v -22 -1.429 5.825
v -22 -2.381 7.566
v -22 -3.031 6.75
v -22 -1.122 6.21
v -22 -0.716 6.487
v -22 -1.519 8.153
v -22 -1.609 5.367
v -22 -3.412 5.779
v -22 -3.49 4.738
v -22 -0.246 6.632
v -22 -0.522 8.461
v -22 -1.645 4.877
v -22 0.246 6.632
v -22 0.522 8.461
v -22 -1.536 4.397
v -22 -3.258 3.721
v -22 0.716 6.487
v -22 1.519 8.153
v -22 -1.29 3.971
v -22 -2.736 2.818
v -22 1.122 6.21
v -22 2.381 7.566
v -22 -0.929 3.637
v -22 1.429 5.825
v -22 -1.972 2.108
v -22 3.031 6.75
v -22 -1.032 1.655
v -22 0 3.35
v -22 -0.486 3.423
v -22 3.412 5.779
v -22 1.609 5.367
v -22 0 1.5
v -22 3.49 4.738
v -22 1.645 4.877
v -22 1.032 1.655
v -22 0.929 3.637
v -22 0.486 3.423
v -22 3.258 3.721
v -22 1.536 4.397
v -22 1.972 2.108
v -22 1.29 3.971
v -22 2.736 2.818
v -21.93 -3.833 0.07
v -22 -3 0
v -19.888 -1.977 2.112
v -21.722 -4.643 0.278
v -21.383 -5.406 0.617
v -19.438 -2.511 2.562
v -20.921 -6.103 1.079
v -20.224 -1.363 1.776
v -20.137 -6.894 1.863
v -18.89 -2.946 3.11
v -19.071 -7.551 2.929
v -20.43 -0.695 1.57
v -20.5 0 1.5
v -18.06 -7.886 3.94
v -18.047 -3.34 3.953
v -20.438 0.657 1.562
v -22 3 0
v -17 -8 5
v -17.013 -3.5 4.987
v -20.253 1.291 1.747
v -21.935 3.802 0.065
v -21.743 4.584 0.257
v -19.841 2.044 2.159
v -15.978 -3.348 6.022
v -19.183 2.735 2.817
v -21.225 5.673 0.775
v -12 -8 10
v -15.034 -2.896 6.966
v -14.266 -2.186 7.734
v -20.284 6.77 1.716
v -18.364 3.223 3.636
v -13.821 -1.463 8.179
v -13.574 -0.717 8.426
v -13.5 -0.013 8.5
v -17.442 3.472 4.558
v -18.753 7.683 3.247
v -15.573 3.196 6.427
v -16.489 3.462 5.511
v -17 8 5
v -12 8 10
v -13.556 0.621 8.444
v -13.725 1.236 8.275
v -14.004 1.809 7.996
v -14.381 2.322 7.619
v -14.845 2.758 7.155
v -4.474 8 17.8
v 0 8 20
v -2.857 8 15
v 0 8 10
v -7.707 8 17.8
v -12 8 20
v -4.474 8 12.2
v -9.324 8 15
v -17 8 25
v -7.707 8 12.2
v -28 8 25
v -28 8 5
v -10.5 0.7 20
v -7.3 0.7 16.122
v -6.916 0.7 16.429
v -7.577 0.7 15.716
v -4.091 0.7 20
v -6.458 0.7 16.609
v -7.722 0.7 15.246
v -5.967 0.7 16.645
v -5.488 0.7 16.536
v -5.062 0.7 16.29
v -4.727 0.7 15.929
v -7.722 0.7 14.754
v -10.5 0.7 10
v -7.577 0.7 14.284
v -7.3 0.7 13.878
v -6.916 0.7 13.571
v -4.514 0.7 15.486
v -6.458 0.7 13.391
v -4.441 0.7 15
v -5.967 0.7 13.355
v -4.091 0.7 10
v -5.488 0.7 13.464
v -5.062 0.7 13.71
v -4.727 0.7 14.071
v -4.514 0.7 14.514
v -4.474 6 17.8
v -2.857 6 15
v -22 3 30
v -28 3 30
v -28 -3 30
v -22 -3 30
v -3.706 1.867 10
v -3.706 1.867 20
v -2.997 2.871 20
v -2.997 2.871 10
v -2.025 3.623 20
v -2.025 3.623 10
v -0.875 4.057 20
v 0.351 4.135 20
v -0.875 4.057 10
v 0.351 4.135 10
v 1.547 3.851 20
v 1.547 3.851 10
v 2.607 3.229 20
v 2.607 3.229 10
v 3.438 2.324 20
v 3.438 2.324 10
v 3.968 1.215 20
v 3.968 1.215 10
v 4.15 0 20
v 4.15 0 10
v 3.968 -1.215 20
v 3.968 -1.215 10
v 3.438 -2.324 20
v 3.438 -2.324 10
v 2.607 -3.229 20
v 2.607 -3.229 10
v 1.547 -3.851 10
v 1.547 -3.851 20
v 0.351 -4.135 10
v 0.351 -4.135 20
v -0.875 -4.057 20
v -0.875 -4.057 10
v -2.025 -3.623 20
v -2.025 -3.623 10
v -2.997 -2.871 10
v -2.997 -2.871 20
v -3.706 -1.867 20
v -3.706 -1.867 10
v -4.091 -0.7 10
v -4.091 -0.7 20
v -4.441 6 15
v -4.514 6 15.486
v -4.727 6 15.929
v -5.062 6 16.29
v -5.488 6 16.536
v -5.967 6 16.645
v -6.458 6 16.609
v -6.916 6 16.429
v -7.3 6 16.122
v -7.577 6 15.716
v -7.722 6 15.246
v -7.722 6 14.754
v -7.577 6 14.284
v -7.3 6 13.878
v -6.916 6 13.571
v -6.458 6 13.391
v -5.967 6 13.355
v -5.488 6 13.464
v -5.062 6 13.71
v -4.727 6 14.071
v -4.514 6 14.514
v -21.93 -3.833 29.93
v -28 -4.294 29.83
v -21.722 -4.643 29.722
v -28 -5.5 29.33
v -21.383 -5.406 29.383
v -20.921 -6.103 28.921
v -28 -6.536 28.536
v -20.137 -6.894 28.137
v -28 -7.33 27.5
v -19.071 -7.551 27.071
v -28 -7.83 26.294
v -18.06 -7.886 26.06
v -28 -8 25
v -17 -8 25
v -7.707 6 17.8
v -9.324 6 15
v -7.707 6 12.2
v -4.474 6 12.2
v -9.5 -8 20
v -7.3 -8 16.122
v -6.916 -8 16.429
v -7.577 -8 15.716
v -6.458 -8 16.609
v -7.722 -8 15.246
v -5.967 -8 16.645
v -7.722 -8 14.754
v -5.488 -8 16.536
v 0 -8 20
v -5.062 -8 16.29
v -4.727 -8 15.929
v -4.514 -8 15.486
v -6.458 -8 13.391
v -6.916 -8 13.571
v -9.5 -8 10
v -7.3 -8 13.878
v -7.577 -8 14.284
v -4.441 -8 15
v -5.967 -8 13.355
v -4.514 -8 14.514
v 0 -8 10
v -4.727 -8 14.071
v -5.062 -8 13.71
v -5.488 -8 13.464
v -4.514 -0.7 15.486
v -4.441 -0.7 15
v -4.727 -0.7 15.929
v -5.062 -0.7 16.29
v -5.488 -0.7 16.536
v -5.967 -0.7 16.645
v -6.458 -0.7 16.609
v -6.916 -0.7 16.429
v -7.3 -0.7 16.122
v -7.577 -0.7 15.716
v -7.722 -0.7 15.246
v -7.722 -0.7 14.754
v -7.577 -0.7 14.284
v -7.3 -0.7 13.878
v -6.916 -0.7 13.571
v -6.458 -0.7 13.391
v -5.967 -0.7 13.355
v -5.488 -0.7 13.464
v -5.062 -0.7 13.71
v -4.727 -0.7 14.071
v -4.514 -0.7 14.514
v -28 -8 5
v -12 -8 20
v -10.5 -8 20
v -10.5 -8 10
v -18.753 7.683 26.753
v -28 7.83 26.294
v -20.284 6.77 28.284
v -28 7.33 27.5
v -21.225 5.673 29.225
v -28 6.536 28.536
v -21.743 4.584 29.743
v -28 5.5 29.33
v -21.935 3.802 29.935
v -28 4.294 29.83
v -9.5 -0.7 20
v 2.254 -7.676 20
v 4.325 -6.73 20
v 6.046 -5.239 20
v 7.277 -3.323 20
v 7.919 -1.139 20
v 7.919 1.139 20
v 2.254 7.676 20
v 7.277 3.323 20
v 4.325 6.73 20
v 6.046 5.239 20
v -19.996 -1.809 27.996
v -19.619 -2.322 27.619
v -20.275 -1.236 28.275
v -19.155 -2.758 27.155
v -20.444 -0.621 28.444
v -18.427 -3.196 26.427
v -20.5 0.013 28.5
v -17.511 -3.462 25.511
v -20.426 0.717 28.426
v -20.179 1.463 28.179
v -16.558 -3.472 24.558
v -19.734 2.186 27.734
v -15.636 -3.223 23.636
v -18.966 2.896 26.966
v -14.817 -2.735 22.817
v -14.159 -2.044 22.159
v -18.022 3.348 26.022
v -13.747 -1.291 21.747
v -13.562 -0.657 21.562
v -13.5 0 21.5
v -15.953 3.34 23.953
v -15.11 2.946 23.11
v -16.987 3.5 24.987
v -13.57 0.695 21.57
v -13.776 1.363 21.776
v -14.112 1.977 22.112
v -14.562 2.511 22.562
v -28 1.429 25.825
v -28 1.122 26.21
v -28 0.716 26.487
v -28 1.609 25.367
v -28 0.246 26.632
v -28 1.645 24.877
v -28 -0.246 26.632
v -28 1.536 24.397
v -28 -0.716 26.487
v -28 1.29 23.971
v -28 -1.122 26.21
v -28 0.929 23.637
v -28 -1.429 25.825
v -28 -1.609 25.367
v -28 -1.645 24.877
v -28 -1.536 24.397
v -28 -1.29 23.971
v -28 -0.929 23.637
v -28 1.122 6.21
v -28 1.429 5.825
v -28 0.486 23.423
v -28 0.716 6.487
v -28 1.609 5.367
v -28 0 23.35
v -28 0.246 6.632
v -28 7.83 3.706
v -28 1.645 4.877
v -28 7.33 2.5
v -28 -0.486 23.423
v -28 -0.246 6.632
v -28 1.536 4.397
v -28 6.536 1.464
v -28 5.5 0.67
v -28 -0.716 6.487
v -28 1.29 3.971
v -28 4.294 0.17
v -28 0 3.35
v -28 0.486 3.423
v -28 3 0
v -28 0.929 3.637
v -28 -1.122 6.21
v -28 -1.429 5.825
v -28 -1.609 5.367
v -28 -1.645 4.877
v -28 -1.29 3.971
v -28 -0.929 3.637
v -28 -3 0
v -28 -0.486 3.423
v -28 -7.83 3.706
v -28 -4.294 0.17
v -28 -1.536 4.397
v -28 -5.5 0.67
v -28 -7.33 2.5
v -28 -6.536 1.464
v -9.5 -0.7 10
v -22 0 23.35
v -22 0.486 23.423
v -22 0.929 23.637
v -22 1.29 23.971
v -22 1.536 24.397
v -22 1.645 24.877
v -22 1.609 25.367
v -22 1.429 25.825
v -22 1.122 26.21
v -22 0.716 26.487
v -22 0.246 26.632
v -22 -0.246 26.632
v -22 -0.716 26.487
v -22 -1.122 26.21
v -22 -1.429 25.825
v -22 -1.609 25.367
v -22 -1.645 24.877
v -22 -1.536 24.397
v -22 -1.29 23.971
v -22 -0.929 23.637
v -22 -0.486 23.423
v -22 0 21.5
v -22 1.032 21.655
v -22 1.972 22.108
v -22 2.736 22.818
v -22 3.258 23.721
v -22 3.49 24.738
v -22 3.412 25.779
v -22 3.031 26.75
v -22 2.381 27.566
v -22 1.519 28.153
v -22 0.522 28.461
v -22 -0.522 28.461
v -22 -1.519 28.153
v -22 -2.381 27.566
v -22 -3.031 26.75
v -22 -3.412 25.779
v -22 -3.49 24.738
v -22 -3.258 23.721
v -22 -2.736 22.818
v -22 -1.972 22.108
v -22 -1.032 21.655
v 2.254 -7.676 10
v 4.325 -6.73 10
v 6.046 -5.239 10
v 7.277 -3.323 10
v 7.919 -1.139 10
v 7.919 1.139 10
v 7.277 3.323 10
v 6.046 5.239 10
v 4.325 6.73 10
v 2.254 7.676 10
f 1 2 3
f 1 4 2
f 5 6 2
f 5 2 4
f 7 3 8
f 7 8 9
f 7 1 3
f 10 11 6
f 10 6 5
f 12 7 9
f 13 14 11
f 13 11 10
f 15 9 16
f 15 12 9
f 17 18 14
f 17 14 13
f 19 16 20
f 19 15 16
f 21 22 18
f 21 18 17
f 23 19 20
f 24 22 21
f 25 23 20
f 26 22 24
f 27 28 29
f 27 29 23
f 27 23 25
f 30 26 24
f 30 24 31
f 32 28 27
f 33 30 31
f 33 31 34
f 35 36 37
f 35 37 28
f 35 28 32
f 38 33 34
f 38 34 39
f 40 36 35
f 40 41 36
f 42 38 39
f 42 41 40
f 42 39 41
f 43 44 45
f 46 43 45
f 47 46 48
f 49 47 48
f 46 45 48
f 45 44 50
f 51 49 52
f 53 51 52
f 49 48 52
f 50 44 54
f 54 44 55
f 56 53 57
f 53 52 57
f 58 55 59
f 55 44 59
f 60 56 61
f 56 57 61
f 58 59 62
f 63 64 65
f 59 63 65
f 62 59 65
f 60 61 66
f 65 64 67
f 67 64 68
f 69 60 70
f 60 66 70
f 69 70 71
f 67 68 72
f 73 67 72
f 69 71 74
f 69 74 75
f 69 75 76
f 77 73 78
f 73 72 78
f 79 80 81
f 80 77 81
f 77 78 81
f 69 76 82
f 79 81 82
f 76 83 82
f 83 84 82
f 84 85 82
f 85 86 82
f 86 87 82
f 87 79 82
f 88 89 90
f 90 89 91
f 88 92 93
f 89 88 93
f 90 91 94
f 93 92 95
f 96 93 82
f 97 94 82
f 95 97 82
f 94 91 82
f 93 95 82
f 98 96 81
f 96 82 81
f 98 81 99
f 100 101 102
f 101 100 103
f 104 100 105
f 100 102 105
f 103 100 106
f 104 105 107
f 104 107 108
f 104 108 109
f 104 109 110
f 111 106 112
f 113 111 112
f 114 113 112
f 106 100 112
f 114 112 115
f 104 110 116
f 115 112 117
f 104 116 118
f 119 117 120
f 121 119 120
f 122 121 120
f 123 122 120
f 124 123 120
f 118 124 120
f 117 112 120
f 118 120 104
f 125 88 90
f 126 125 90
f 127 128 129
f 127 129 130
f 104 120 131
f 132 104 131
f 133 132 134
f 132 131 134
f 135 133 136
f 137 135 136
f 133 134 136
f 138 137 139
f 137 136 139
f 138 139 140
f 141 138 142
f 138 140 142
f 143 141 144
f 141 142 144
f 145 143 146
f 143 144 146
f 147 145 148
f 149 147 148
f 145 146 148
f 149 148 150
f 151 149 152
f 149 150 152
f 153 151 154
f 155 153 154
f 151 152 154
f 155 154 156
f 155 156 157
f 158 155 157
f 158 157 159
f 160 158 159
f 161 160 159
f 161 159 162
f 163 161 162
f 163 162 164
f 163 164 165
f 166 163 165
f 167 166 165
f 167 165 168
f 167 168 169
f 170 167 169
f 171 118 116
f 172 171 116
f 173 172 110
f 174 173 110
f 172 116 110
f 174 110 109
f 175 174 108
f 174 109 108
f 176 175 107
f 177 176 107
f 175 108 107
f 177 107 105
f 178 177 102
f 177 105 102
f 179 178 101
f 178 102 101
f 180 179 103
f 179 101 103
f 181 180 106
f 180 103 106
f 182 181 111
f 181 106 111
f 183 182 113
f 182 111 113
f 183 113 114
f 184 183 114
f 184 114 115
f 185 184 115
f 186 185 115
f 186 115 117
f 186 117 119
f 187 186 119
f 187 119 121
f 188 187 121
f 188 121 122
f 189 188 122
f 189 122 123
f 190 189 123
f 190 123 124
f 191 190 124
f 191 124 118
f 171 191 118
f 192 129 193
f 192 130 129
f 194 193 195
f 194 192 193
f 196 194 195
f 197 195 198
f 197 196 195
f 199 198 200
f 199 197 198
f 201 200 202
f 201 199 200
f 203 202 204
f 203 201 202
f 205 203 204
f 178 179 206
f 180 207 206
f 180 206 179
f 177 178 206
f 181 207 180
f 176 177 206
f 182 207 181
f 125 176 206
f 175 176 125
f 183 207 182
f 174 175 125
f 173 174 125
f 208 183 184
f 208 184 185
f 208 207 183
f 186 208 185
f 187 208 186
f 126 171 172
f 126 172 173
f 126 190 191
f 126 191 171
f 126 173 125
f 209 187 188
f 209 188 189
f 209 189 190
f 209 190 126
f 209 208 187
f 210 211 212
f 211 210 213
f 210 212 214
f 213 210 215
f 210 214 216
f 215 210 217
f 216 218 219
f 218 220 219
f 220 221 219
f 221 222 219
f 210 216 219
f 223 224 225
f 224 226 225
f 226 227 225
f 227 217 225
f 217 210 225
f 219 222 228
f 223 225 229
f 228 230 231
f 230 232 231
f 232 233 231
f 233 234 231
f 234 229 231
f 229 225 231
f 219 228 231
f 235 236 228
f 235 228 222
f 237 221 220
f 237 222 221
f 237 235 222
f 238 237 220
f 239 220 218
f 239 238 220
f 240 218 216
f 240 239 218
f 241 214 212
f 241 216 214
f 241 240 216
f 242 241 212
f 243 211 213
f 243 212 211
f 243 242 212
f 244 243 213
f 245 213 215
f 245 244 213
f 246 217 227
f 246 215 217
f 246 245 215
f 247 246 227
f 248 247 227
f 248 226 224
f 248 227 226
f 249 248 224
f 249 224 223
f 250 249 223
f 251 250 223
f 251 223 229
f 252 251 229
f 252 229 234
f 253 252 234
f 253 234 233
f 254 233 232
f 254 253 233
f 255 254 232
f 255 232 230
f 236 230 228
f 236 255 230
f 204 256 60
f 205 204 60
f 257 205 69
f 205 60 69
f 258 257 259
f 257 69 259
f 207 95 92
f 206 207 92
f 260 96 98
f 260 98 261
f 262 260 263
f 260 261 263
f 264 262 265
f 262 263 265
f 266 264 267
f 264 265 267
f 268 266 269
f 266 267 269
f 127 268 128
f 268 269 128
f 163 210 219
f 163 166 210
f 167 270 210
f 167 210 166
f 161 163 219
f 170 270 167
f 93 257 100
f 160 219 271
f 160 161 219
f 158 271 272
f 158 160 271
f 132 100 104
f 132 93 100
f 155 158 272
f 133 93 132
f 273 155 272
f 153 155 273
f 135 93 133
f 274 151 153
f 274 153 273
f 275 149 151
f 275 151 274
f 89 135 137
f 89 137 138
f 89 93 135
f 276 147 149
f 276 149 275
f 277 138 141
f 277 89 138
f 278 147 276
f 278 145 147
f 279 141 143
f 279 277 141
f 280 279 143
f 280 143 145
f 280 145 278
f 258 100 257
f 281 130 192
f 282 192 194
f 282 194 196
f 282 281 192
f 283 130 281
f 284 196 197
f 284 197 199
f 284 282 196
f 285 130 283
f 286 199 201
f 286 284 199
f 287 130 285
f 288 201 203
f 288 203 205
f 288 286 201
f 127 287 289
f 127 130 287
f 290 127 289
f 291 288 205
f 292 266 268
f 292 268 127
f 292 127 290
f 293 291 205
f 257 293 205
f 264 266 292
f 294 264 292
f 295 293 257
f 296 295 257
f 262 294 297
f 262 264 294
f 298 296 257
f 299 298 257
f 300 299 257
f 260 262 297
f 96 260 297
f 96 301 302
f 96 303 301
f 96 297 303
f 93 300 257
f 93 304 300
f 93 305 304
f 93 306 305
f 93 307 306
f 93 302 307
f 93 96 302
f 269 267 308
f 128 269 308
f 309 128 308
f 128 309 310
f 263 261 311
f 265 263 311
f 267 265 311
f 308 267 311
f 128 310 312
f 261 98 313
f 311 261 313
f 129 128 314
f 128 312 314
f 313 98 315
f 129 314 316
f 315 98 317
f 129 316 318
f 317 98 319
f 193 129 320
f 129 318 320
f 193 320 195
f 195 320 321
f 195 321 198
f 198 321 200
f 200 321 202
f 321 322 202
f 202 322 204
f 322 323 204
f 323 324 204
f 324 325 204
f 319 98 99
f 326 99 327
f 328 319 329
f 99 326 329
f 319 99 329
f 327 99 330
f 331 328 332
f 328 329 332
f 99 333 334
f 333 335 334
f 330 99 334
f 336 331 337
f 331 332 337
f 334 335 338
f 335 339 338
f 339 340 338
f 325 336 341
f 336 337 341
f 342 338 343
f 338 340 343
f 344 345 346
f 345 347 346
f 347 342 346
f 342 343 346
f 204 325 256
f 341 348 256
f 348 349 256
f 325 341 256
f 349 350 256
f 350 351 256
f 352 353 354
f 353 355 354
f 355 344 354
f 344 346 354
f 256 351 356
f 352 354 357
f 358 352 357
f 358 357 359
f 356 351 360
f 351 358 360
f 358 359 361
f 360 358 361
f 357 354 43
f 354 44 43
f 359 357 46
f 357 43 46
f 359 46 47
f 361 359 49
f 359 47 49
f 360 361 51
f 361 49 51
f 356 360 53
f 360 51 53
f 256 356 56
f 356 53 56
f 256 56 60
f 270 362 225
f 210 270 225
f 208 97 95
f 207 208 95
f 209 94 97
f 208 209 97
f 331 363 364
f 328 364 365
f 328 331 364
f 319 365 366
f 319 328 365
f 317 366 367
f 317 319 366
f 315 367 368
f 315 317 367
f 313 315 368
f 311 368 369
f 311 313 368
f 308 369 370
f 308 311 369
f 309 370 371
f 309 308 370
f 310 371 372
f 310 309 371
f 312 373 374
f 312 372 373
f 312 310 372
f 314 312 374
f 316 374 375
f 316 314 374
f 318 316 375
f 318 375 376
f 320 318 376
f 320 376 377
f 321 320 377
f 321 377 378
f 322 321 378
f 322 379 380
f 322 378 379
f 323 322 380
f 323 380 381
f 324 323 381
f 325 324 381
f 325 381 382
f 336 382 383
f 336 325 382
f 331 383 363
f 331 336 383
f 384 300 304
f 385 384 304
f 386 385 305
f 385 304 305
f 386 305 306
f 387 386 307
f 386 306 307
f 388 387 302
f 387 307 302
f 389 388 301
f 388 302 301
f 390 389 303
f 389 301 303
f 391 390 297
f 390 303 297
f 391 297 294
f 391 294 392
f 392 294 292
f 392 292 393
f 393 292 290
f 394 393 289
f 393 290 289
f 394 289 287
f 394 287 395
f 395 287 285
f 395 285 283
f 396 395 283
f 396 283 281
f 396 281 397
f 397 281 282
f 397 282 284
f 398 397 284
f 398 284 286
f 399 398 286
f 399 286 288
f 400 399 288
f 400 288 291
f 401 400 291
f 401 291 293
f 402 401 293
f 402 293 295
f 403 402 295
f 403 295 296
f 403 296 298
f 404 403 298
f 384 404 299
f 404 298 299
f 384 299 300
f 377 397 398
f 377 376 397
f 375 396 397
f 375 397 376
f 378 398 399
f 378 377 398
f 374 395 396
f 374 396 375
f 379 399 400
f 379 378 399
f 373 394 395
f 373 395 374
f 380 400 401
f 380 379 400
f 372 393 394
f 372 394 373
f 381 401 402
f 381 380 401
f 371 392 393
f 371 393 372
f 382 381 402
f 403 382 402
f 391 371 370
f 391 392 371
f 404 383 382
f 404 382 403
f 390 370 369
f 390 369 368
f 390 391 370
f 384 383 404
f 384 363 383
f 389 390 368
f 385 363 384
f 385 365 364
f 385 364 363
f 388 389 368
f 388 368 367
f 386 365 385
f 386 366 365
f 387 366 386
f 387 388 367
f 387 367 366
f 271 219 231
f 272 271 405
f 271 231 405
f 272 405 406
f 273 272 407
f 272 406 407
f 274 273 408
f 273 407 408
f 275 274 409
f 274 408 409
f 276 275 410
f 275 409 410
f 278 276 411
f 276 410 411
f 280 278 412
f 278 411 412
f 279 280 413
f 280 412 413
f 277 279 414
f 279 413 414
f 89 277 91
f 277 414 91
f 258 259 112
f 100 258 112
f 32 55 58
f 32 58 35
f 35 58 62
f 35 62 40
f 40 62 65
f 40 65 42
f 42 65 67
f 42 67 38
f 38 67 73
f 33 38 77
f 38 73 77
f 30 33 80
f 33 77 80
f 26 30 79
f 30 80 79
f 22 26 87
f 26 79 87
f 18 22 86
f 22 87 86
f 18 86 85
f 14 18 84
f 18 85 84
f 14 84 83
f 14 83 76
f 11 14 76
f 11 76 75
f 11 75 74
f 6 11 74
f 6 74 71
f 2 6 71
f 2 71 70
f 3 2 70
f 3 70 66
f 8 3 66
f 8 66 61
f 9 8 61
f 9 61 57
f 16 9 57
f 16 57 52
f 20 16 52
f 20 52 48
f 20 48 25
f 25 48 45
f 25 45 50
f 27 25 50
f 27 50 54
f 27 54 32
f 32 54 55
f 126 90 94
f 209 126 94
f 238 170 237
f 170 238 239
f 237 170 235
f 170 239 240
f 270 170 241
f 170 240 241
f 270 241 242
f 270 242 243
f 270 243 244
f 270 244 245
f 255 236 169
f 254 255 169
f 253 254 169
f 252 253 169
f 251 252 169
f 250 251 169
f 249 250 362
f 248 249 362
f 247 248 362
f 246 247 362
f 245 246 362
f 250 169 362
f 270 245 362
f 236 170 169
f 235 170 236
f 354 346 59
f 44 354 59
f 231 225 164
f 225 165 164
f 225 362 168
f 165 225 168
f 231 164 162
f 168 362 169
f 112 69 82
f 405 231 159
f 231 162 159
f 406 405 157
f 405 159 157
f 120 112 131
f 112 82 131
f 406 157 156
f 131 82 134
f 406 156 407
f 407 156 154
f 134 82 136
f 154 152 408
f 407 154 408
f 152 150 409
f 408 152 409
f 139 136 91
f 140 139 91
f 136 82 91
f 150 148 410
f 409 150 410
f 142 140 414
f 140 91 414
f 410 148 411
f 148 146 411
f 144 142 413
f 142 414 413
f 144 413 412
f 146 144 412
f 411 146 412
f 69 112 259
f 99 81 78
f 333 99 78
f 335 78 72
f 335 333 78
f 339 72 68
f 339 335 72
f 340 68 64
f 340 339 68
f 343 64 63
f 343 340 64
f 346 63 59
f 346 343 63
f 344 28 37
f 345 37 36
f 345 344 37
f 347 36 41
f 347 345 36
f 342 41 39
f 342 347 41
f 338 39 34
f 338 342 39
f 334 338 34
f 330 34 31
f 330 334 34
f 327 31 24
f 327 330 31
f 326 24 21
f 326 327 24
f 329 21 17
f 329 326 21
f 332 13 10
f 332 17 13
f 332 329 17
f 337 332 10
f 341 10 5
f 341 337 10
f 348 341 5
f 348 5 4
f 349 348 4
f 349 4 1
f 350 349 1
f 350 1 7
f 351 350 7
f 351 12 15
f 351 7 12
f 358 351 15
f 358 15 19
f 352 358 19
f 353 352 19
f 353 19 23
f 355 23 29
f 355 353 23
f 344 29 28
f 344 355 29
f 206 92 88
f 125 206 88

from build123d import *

# Parameters (mm, degrees)
RESSALTO_EXTRUS_O1_DEPTH   = 30
CORTE_EXTRUS_O6_DEPTH      = 17
ESBO_O6_R                  = 1.65
CORTE_EXTRUS_O4_DEPTH      = 9.7
CORTE_EXTRUS_O4_DEPTH_BACK = 8.3
CORTE_EXTRUS_O5_DEPTH      = 2
ESBO_O9_R                  = 1.65
CORTE_EXTRUS_O7_DEPTH      = 37
FILETE1_R                  = 5
ESBO_O10_R                 = 3.5
CORTE_EXTRUS_O8_DEPTH      = 22


with BuildPart() as part:
    # Esboço2 → Ressalto-extrusão1 (new body)
    with BuildSketch(Plane.XY):
        with BuildLine():
            Line((0, 8), (-28, 8))
            Line((-28, 8), (-28, -8))
            Line((-28, -8), (-10.5, -8))
            Line((-10.5, -8), (-10.5, 0.7))
            Line((-10.5, 0.7), (-4.090537862, 0.7))
            ThreePointArc((-4.090537862, 0.7), (4.15, 0), (-4.090537862, -0.7))
            Line((-4.090537862, -0.7), (-9.5, -0.7))
            Line((-9.5, -0.7), (-9.5, -8))
            Line((-9.5, -8), (0, -8))
            ThreePointArc((0, -8), (8, 0), (0, 8))
        make_face()
    extrude(amount=RESSALTO_EXTRUS_O1_DEPTH)

    # Esboço8 → Corte-extrusão6 (cut, through all)
    with BuildSketch(Plane(origin=(0, 8, 0), x_dir=(1, 0, 0), z_dir=(0, 1, 0))):
        Polygon((-22, -30), (-12, -20), (8, -20), (8, -30), align=None)
        Polygon((8, 0), (-22, 0), (-12, -10), (8, -10), align=None)
    extrude(amount=-CORTE_EXTRUS_O6_DEPTH, mode=Mode.SUBTRACT)

    # Esboço6 → Corte-extrusão4 (cut, two sides)
    with BuildSketch(Plane.XZ.offset(-0.7)) as corte_extrus_o4_sk:
        with Locations((-6.090537862, 15)):
            Circle(ESBO_O6_R)
    extrude(amount=CORTE_EXTRUS_O4_DEPTH, mode=Mode.SUBTRACT)
    extrude(corte_extrus_o4_sk.sketch, amount=-CORTE_EXTRUS_O4_DEPTH_BACK, mode=Mode.SUBTRACT)

    # Esboço7 → Corte-extrusão5 (cut)
    with BuildSketch(Plane(origin=(0, 8, 0), x_dir=(1, 0, 0), z_dir=(0, 1, 0))):
        Polygon((-2.857376354, -15), (-4.473957108, -12.2), (-7.707118616, -12.2), (-9.323699369, -15), (-7.707118616, -17.8), (-4.473957108, -17.8), align=None)
    extrude(amount=-CORTE_EXTRUS_O5_DEPTH, mode=Mode.SUBTRACT)

    # Esboço9 → Corte-extrusão7 (cut, through all)
    with BuildSketch(Plane(origin=(-28, 0, 19.455844123), x_dir=(0, 0, -1), z_dir=(1, 0, 0))):
        with Locations((14.455844123, 0)):
            Circle(ESBO_O9_R)
        with Locations((-5.544155877, 0)):
            Circle(ESBO_O9_R)
    extrude(amount=CORTE_EXTRUS_O7_DEPTH, mode=Mode.SUBTRACT)

    # Filete1
    filete1_edges = [part.edges().sort_by_distance(p)[0] for p in [
        (-25, -8, 0),
        (-25, 8, 30),
        (-25, -8, 30),
        (-25, 8, 0),
    ]]
    fillet(filete1_edges, radius=FILETE1_R)

    # Esboço10 → Corte-extrusão8 (cut)
    with BuildSketch(Plane(origin=(0, 0, 0), x_dir=(0, 0, -1), z_dir=(1, 0, 0))):
        with Locations((-25, 0)):
            Circle(ESBO_O10_R)
        with Locations((-5, 0)):
            Circle(ESBO_O10_R)
    extrude(amount=-CORTE_EXTRUS_O8_DEPTH, mode=Mode.SUBTRACT)


solid = part.part
